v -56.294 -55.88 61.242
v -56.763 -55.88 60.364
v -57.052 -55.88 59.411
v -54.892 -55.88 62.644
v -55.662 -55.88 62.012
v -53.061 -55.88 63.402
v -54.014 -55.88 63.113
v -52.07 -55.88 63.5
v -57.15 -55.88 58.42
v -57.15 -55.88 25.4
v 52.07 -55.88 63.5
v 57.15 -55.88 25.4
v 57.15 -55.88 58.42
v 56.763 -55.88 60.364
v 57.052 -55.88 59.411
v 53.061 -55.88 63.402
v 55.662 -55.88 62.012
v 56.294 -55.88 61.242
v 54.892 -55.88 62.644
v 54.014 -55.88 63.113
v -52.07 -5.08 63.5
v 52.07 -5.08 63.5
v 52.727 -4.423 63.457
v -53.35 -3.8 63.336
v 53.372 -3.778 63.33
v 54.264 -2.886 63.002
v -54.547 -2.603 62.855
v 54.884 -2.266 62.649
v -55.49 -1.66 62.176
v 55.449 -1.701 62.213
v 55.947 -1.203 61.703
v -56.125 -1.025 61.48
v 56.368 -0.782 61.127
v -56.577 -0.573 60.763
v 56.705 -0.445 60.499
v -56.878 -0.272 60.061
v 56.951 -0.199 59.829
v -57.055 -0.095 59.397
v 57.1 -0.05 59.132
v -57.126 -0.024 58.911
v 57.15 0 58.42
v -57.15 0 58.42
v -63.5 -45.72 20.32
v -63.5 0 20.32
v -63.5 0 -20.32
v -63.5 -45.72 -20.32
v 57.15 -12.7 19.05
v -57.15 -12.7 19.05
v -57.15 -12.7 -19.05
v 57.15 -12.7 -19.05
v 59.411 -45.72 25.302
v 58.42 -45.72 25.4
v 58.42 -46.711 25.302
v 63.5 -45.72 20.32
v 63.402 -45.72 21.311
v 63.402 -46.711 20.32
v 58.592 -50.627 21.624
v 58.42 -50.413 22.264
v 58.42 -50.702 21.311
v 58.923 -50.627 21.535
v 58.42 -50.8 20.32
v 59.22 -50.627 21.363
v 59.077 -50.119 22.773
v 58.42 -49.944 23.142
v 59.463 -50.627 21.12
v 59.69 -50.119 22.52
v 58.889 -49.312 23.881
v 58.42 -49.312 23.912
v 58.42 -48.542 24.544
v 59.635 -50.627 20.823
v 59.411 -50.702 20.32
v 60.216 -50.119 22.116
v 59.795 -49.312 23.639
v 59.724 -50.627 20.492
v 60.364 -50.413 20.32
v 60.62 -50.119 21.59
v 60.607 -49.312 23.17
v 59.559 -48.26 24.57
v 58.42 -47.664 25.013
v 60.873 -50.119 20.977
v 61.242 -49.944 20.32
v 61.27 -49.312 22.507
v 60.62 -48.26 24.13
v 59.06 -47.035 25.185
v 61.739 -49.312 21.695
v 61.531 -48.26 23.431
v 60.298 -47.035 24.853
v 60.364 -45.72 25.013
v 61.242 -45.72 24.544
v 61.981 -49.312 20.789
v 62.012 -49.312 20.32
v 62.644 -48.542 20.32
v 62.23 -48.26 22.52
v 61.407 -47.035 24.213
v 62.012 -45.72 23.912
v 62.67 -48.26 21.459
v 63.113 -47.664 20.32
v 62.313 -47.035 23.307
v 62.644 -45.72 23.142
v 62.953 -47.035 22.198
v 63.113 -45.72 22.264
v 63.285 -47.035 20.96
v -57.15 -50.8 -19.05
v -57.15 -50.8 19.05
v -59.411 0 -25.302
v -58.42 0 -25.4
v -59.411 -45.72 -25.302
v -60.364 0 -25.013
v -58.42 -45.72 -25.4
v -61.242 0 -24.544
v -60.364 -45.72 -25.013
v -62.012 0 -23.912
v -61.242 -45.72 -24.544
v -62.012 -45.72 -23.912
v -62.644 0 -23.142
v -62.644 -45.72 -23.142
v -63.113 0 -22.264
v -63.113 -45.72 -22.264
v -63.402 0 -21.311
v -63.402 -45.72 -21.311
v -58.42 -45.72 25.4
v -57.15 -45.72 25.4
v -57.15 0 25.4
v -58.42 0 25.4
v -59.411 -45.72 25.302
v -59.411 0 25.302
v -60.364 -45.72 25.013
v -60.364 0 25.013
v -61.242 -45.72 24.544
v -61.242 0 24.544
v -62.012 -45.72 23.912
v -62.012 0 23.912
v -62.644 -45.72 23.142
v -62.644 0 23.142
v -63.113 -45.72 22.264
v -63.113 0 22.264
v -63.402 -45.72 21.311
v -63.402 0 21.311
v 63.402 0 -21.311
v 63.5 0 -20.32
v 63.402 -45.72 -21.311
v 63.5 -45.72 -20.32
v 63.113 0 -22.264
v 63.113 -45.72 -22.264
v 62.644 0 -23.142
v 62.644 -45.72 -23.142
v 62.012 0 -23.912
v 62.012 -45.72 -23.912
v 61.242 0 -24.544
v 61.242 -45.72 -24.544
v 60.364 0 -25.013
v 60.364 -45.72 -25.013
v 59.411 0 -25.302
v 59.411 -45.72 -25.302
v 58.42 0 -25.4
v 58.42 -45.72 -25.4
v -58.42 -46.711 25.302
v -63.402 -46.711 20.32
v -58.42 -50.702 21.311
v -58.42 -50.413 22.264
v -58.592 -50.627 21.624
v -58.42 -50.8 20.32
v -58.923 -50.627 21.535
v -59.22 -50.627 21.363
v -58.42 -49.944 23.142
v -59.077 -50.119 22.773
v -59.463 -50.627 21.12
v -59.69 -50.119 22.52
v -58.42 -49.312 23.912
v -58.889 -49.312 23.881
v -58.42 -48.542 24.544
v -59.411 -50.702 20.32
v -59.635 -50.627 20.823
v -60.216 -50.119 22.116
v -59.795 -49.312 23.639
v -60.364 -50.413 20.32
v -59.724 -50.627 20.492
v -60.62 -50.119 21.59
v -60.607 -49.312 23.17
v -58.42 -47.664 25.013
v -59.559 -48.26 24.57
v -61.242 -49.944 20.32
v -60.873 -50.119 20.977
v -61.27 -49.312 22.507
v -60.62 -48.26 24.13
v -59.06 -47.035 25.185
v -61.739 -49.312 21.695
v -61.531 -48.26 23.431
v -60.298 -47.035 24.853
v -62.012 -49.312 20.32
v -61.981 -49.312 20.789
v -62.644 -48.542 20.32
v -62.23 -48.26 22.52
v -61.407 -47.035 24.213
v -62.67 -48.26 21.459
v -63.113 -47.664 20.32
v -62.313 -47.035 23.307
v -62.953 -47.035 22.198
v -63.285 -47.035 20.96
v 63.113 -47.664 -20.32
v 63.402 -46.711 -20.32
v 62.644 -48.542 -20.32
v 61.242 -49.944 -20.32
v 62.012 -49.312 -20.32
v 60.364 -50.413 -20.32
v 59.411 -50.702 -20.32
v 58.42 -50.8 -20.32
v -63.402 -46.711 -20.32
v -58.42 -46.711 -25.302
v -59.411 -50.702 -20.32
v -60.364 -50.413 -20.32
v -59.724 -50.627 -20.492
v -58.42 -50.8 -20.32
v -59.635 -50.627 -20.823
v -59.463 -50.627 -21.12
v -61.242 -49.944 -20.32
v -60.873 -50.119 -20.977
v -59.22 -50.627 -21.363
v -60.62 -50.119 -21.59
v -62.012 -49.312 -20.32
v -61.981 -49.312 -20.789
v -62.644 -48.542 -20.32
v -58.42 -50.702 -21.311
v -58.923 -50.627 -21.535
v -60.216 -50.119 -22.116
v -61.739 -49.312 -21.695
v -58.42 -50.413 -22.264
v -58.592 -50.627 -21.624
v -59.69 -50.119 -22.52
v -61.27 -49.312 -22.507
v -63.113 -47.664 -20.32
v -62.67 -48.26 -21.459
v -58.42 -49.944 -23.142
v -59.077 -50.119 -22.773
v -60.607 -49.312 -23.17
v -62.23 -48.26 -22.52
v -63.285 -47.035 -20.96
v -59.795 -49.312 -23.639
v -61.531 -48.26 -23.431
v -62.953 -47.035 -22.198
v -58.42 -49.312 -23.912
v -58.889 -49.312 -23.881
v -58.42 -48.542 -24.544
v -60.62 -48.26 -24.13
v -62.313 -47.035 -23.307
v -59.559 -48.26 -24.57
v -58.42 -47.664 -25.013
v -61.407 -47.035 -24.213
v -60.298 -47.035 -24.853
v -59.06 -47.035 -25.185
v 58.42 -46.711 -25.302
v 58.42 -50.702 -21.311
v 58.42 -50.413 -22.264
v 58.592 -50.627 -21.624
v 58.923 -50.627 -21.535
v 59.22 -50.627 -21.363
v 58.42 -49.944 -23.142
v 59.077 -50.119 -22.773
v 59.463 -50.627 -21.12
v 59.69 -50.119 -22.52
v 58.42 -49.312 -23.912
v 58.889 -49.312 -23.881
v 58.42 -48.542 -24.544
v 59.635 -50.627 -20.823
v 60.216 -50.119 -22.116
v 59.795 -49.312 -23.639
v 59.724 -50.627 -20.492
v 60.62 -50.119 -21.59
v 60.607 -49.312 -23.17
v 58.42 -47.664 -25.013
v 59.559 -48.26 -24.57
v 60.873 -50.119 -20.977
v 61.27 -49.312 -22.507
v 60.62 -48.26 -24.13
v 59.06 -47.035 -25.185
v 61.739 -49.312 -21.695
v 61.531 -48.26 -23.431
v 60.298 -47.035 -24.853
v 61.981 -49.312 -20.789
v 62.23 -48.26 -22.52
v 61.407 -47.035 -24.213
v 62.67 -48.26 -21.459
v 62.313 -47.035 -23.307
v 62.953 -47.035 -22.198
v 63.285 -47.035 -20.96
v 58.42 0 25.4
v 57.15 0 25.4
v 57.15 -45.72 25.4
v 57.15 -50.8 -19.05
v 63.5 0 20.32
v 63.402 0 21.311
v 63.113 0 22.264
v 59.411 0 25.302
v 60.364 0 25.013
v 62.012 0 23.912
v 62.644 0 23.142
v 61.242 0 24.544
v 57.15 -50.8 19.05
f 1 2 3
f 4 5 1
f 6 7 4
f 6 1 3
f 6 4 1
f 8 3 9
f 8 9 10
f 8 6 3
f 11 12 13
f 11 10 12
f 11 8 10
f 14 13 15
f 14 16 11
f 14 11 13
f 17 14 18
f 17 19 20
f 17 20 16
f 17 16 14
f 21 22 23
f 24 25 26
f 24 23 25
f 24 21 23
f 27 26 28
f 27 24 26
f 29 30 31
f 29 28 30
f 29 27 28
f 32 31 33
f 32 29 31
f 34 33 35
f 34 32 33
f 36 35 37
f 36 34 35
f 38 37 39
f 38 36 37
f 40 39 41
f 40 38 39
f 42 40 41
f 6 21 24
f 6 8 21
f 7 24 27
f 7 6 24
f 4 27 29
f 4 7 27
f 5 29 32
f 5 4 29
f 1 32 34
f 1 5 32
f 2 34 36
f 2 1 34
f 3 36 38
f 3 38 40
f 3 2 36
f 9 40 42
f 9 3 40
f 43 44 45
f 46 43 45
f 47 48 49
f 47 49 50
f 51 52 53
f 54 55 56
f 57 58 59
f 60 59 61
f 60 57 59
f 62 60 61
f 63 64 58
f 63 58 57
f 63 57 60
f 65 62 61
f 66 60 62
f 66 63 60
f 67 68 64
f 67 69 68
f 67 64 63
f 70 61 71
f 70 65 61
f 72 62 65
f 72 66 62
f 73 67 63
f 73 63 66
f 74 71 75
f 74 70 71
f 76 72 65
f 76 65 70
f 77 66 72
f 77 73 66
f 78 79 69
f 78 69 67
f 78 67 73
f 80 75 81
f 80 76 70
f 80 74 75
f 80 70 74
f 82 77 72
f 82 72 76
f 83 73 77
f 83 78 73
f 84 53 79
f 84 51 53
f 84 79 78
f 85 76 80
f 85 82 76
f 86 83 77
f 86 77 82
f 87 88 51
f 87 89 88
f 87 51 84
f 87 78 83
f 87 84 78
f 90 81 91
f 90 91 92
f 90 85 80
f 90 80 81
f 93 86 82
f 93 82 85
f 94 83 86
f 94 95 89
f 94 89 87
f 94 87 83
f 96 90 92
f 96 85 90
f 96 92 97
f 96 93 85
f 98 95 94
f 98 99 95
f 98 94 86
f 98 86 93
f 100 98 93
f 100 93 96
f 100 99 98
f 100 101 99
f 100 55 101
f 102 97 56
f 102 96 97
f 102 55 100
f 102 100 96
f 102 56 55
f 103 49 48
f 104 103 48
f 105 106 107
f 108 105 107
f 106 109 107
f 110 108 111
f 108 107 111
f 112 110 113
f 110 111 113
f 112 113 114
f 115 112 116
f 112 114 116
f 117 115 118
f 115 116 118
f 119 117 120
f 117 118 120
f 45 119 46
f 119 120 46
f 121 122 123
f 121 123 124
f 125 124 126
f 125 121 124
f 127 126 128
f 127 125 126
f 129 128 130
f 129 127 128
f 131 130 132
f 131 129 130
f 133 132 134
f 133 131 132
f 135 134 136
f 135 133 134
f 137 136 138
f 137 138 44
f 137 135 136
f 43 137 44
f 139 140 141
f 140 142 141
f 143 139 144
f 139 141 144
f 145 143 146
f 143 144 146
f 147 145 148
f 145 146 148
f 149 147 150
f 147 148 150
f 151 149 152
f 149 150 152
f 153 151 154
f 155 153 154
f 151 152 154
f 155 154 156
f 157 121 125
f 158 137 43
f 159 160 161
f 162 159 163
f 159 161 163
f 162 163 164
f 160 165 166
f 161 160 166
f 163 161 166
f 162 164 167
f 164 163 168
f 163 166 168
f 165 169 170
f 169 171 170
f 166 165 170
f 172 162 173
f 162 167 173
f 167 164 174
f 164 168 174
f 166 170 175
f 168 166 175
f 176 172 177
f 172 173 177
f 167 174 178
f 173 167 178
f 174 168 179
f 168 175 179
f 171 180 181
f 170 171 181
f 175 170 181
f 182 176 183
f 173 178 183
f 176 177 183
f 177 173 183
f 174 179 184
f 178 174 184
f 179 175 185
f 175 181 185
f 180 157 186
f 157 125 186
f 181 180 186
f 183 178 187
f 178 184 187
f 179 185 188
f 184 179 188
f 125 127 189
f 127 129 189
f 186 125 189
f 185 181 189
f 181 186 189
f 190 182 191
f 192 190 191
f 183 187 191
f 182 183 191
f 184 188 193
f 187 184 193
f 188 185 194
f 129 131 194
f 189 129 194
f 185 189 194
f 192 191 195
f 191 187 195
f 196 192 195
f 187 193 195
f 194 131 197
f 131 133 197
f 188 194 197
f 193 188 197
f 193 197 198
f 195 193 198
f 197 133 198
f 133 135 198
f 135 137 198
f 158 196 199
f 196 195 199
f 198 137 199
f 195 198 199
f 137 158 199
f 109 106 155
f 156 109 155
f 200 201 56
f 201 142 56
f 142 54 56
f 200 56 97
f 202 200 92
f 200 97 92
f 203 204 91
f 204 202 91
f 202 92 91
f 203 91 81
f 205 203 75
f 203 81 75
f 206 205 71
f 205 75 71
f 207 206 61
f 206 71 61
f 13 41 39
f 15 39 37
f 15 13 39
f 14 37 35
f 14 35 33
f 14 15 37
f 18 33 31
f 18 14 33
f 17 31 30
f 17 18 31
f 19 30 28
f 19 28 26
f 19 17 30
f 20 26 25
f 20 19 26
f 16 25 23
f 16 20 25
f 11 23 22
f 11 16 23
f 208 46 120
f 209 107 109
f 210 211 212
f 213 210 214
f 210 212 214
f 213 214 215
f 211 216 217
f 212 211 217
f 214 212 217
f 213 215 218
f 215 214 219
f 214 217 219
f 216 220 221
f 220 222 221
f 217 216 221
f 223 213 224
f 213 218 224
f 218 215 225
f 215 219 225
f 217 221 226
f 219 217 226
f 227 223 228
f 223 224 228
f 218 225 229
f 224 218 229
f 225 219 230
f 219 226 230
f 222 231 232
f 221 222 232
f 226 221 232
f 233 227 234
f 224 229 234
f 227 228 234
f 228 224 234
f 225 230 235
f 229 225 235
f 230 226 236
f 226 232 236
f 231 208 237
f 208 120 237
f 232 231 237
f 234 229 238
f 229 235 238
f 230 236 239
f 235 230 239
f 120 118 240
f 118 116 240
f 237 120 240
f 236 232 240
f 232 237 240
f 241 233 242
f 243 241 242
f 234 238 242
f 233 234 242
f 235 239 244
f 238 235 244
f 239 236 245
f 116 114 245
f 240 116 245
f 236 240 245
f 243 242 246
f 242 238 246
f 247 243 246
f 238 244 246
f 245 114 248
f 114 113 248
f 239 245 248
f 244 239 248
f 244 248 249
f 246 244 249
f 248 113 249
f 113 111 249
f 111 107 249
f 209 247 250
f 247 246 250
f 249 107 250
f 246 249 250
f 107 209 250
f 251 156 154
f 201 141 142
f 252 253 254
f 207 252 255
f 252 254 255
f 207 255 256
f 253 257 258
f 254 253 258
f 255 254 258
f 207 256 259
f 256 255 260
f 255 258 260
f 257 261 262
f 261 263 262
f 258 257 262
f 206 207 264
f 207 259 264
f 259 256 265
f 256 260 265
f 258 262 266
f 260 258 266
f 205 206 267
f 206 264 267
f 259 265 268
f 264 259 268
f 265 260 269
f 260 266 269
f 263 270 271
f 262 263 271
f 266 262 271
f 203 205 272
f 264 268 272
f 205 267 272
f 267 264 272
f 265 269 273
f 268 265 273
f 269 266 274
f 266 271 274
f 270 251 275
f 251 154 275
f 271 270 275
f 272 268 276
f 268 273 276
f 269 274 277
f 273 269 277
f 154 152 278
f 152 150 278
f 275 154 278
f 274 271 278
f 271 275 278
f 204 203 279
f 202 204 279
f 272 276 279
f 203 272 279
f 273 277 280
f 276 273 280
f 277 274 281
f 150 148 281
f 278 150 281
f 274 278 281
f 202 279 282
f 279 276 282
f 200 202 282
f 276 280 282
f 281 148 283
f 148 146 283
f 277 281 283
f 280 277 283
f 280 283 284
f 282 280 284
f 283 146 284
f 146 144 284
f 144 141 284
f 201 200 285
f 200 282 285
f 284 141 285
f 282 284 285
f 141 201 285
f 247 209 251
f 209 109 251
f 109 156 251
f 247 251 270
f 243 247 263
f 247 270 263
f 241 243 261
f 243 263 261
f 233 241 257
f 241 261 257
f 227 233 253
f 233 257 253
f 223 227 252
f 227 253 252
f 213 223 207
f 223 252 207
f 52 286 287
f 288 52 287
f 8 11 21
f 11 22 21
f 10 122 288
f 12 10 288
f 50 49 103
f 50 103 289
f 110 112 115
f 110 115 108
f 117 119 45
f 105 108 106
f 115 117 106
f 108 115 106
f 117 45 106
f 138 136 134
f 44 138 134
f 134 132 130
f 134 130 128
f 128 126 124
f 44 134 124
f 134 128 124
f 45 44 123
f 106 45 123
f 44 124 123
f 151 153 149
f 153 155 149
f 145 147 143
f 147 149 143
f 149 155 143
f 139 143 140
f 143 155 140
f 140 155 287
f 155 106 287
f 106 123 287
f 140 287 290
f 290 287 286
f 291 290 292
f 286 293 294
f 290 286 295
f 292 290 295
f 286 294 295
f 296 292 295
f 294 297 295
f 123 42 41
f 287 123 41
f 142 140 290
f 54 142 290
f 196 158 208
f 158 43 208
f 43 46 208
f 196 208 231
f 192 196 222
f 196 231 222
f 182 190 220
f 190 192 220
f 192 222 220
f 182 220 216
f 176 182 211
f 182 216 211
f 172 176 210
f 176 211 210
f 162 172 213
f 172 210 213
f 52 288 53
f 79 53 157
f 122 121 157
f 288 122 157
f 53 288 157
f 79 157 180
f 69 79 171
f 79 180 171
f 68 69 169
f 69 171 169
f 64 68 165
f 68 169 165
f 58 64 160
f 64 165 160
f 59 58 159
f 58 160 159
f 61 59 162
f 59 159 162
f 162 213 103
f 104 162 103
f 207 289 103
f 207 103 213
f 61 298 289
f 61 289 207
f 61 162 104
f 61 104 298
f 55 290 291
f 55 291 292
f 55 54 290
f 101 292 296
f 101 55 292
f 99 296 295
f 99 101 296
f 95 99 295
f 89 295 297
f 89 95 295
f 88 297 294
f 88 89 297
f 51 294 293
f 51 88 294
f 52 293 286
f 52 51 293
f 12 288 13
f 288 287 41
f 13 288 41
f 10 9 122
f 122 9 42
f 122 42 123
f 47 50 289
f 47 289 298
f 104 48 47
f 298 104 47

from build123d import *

# Parameters (mm, degrees)
F0_W     = 114.3
F0_H     = 38.1
F1_DEPTH = 50.8
F2_DEPTH = 12.7
F3_R     = 5.08
F4_DEPTH = 55.88
F5_R     = 5.08


with BuildPart() as f1:
    # F0 (on Front) → F1 (new body)
    with BuildSketch(Plane.XZ):
        Polygon((63.5, -25.4), (63.5, 25.4), (57.15, 25.4), (0, 25.4), (-57.15, 25.4), (-63.5, 25.4), (-63.5, -25.4), align=None)
        Rectangle(F0_W, F0_H, mode=Mode.SUBTRACT)
    extrude(amount=F1_DEPTH)

    # F0 (on Front) → F2 (join)
    with BuildSketch(Plane.XZ):
        Rectangle(F0_W, F0_H)
    extrude(amount=F2_DEPTH)

    # F3
    f3_edges = [f1.edges().sort_by_distance(p)[0] for p in [
        (-63.5, -25.4, 25.4),
        (-63.5, -25.4, -25.4),
        (63.5, -25.4, -25.4),
        (63.5, -25.4, 25.4),
        (0, -50.8, 25.4),
        (-63.5, -50.8, 0),
        (0, -50.8, -25.4),
        (63.5, -50.8, 0),
    ]]
    fillet(f3_edges, radius=F3_R)

    # F0 (on Front) → F4 (join)
    with BuildSketch(Plane.XZ):
        Polygon((0, 25.4), (57.15, 25.4), (57.15, 63.5), (-57.15, 63.5), (-57.15, 25.4), align=None)
    extrude(amount=F4_DEPTH)

    # F5
    f5_edges = [f1.edges().sort_by_distance(p)[0] for p in [
        (-57.15, -27.94, 63.5),
        (57.15, -27.94, 63.5),
        (0, 0, 63.5),
    ]]
    fillet(f5_edges, radius=F5_R)


solid = f1.part
